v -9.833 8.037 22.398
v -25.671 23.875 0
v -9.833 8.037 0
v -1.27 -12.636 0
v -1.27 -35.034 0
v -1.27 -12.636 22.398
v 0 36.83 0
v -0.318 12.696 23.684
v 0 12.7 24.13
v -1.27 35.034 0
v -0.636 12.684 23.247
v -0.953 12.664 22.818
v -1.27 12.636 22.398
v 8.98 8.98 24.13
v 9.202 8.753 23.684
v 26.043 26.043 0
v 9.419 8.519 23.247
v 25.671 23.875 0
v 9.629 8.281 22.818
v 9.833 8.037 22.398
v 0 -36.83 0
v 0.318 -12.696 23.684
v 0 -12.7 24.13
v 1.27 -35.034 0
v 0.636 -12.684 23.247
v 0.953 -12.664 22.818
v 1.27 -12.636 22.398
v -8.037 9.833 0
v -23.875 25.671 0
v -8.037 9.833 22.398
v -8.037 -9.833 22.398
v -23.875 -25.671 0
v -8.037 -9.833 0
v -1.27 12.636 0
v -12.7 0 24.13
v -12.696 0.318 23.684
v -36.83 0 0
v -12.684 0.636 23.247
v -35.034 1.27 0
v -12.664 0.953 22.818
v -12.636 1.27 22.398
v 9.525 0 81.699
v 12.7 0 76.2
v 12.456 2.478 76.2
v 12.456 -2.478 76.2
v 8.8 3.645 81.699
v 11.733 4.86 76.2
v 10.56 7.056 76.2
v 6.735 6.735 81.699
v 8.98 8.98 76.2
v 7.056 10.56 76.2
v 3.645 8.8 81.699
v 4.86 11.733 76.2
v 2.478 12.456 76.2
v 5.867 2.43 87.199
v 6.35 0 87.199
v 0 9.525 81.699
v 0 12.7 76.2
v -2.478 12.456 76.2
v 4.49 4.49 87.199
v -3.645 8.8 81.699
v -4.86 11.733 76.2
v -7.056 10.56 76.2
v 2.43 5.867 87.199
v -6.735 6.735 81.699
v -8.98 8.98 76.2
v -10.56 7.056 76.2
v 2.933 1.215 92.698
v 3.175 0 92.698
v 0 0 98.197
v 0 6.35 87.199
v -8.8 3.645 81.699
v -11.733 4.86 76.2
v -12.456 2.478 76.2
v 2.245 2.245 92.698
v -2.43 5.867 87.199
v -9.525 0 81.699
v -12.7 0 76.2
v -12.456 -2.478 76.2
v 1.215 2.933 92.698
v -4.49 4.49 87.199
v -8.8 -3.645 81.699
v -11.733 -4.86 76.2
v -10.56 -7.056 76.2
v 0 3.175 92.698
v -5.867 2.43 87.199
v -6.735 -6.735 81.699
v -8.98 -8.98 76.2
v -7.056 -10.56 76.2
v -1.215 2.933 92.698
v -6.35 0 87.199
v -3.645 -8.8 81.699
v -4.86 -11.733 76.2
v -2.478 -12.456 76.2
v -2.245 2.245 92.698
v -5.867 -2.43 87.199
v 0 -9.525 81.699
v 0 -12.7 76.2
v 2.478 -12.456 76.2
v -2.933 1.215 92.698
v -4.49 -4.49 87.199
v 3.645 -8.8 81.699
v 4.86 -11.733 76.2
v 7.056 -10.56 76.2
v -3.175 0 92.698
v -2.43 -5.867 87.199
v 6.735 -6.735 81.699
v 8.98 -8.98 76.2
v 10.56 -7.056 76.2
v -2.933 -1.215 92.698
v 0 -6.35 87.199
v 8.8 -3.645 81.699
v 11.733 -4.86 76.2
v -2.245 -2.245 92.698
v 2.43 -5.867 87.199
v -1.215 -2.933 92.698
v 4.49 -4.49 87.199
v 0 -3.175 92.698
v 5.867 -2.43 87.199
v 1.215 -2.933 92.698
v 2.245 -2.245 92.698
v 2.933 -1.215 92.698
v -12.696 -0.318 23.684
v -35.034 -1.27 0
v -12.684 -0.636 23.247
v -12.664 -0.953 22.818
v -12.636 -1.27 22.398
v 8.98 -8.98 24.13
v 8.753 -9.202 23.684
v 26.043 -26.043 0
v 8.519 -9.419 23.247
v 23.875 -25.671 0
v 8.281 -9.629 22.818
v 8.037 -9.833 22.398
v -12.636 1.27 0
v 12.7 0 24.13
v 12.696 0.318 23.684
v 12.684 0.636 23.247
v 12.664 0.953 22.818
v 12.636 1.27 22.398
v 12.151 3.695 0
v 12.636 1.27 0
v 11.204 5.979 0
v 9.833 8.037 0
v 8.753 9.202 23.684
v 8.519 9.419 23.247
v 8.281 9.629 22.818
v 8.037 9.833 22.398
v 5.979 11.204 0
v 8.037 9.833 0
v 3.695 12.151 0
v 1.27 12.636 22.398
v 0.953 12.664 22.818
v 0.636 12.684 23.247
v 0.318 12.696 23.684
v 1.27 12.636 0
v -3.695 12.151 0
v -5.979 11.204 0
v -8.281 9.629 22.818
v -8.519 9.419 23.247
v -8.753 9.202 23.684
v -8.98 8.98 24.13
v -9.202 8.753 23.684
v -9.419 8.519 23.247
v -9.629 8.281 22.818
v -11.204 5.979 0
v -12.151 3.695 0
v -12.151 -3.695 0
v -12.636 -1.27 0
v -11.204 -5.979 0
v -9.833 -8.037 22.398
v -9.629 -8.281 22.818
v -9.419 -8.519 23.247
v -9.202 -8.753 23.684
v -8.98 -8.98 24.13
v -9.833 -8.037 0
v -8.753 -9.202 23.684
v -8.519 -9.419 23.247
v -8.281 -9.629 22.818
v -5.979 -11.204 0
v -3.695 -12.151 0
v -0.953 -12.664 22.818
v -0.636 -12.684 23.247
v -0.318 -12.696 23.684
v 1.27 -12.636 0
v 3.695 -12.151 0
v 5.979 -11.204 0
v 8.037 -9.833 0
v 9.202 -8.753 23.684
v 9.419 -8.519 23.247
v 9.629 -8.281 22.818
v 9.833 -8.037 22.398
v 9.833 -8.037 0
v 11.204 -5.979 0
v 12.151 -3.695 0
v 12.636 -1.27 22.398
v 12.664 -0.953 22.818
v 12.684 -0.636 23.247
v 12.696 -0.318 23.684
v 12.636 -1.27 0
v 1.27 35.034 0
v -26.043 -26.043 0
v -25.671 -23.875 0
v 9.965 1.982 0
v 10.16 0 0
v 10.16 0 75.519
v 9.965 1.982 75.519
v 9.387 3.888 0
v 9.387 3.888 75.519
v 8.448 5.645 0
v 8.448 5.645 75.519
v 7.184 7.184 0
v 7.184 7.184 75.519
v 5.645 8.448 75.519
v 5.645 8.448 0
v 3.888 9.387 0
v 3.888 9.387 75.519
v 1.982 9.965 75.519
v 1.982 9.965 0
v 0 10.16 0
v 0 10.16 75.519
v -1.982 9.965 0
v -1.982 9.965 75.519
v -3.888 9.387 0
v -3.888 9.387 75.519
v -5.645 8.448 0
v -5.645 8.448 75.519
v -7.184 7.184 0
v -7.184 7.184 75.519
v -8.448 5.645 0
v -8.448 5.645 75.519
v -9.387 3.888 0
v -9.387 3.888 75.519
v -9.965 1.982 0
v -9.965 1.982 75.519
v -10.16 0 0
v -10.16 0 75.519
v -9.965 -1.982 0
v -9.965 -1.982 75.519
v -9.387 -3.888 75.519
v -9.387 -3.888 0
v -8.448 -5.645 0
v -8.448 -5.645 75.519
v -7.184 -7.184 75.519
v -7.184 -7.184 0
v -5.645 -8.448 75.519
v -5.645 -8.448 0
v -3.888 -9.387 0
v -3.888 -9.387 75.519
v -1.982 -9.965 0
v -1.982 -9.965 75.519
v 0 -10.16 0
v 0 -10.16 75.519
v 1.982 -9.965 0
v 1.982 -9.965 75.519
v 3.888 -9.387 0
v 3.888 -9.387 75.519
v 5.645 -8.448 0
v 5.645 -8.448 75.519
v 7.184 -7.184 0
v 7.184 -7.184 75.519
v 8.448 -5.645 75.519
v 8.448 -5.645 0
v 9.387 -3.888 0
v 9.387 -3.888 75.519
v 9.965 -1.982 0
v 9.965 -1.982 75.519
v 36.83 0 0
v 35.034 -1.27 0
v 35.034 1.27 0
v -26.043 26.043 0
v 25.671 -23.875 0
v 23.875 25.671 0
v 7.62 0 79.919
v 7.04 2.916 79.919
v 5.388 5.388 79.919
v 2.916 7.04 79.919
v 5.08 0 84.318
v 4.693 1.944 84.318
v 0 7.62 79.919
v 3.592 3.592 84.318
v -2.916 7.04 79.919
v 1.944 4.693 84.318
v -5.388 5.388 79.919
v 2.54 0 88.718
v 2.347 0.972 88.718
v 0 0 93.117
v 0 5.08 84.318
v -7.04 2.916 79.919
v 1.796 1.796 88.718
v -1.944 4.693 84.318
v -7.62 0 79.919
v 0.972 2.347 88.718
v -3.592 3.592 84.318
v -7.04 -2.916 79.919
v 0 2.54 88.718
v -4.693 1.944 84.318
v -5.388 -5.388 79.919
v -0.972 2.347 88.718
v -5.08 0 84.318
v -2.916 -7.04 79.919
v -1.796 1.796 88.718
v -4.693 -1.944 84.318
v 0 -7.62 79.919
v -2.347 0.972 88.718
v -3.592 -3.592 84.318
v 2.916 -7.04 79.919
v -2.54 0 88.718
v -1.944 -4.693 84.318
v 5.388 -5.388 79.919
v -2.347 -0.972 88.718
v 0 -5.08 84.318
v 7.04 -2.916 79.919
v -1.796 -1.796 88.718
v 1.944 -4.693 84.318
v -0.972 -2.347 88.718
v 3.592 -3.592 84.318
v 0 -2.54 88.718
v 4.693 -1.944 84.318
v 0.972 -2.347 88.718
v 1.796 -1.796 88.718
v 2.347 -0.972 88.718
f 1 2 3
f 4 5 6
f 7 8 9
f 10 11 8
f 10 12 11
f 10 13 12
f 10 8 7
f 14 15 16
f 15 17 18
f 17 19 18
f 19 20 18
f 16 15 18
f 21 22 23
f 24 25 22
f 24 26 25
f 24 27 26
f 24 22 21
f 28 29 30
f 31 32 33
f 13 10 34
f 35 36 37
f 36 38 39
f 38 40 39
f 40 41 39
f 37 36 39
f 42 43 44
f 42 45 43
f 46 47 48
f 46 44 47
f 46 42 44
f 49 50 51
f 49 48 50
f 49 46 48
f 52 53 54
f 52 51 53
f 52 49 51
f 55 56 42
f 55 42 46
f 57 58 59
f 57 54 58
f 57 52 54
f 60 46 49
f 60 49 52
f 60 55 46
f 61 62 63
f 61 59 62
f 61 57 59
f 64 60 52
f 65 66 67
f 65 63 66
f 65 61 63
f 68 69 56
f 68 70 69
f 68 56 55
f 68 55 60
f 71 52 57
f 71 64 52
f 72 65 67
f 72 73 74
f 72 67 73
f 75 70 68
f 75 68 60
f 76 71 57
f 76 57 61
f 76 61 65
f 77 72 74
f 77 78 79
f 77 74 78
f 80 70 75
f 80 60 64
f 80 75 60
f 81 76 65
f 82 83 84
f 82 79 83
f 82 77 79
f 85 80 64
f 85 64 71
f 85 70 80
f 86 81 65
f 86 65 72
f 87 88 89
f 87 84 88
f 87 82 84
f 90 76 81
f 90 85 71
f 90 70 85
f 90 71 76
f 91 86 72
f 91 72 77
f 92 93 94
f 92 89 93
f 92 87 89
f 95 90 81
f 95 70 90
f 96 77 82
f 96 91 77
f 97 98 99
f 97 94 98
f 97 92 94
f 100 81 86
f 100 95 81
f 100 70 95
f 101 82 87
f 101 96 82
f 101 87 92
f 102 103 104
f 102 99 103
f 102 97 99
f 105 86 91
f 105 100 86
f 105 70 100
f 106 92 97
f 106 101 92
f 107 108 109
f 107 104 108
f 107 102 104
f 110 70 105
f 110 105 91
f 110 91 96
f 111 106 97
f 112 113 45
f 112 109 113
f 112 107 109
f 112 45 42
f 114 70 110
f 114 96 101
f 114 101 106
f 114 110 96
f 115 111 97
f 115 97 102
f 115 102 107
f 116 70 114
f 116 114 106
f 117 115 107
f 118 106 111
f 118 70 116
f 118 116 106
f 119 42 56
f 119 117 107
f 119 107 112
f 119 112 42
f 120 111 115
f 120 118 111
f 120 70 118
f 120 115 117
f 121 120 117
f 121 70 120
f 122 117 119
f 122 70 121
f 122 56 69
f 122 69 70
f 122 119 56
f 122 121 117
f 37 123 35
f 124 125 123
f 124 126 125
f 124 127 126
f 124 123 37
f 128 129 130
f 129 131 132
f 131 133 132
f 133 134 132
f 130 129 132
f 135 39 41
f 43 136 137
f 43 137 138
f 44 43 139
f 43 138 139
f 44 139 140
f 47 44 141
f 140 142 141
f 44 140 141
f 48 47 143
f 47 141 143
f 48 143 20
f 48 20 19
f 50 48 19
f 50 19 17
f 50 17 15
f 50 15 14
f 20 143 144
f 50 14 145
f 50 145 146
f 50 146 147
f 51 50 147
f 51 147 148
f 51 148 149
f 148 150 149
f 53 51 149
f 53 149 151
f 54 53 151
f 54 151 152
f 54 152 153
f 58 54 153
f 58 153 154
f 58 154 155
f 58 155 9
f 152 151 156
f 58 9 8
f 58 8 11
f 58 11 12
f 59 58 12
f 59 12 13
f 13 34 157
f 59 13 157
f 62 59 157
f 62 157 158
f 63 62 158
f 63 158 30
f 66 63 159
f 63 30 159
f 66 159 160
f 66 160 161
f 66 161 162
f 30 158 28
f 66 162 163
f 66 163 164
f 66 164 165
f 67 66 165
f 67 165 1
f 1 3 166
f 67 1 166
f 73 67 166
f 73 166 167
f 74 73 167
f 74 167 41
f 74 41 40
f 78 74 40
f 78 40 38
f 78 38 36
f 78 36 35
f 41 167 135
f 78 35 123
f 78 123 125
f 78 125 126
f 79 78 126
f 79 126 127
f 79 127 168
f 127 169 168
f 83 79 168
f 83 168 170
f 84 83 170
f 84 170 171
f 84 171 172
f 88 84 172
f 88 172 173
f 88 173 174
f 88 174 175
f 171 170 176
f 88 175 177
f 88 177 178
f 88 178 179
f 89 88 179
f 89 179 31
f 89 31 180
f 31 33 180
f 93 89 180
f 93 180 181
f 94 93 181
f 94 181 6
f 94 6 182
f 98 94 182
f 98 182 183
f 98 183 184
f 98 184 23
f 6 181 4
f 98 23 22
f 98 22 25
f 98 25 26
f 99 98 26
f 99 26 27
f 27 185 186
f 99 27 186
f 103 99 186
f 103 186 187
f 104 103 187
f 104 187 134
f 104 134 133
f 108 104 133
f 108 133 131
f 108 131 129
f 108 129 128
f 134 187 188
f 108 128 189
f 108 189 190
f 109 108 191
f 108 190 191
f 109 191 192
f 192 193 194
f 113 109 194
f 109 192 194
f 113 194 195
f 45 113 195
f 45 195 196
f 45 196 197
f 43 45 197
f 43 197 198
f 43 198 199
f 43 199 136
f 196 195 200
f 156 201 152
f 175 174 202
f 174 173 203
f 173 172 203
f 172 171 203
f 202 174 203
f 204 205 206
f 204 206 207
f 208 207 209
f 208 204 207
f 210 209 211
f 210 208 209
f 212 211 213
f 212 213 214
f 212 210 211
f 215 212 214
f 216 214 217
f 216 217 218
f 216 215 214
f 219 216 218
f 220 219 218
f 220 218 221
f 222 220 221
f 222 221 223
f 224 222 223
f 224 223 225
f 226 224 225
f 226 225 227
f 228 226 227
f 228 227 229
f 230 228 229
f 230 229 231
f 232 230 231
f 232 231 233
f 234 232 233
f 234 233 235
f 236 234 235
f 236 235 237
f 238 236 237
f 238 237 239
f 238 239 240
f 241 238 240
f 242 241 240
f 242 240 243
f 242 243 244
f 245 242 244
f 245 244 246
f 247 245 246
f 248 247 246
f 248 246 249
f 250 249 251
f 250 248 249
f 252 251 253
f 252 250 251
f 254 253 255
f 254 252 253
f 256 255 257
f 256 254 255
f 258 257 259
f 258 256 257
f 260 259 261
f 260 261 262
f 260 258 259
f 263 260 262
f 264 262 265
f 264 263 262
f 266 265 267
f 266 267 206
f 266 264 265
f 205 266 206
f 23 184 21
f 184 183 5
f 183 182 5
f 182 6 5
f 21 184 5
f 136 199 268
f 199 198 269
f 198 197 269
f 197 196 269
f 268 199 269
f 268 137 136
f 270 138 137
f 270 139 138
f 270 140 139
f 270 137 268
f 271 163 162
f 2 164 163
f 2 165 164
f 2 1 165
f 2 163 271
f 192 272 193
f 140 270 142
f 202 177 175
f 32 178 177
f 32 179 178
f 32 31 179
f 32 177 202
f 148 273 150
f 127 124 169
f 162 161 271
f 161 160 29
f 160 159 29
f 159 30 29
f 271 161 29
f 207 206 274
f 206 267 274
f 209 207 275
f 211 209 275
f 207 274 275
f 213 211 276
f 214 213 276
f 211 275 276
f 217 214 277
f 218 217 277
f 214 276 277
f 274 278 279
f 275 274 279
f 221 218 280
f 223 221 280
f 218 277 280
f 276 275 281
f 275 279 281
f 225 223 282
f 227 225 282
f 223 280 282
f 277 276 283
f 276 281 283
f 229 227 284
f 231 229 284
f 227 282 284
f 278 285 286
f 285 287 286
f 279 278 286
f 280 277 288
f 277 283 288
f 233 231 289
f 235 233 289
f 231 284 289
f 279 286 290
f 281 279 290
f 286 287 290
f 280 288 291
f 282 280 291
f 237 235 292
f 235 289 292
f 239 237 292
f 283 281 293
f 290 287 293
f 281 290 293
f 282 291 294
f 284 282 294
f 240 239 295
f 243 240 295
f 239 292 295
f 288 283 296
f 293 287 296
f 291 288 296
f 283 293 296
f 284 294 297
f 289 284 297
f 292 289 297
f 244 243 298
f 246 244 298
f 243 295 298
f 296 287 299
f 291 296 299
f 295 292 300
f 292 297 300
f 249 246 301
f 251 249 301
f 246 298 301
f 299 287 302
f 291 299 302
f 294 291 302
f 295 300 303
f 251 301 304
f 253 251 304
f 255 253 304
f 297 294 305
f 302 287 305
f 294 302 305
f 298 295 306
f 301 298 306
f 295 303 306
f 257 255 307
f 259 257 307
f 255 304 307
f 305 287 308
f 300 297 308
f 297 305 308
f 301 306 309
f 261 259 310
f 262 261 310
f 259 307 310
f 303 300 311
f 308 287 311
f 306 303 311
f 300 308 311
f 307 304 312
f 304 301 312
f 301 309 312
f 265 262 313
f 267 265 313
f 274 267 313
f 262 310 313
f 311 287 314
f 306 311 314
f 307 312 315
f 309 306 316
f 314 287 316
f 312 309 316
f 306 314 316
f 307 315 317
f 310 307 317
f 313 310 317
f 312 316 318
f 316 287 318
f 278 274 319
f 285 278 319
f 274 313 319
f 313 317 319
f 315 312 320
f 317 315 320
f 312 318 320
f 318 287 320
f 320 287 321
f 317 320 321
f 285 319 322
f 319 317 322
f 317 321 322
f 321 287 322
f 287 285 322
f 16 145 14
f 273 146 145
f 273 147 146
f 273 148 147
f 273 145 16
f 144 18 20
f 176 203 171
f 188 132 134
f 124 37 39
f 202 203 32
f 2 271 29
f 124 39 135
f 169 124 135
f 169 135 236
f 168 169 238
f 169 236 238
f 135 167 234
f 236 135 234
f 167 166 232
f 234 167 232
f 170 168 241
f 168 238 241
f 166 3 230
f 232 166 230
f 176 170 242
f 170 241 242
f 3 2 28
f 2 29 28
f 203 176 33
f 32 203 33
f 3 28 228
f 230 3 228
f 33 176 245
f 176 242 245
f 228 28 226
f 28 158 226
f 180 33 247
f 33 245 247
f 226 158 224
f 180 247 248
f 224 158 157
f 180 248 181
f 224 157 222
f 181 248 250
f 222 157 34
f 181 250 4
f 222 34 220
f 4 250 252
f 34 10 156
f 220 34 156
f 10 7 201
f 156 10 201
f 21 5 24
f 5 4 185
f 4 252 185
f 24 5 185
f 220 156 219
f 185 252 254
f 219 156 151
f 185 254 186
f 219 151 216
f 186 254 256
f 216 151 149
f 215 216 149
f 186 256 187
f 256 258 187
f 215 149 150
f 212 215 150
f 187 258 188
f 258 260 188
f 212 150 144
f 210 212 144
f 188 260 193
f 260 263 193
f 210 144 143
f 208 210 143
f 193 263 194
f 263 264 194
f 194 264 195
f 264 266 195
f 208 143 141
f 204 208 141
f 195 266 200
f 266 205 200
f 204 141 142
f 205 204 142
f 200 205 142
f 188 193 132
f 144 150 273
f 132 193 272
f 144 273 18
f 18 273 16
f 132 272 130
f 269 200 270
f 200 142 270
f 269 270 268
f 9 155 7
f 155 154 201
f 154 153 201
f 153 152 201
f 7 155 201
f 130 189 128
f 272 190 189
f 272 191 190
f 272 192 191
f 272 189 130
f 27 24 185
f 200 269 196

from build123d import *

# Parameters (mm, degrees)
F0_R      = 12.7
F1_DEPTH  = 76.2
F1_FACE_R = 12.7
F2_DEPTH  = 25.4
F2_TAPER  = 30
F3_T      = -2.54
F5_DEPTH  = 1.27
F6_SIZE   = 1.2699
F7_COUNT  = 8


# Not quite as in the source:
# - a fillet or chamfer is up to 0.001 mm smaller than in the source, because OpenCascade refuses the exact size


with BuildPart() as f1:
    # F0 (on Top) → F1 (new body)
    with BuildSketch(Plane.XY):
        Circle(F0_R)
    extrude(amount=F1_DEPTH)

    # F1_face (on face) → F2 (join)
    with BuildSketch(Plane.XY.offset(76.2)):
        Circle(F1_FACE_R)
    extrude(amount=F2_DEPTH, taper=F2_TAPER)

    # F3
    f3_openings = [f1.faces().sort_by_distance(p)[0] for p in [
        (0, 0, 0),
    ]]
    offset(amount=F3_T, openings=f3_openings)

    # F4 (on Front) → F5 (join, symmetric)
    with BuildSketch(Plane.XZ):
        Polygon((-11.43, 25.4), (-36.83, 0), (-11.43, 0), align=None)
    extrude(amount=F5_DEPTH, both=True)

    # F6 (size 1.27 in the source; OpenCascade refuses exactly that, so slightly less here)
    f6_edges = [f1.edges().sort_by_distance(p)[0] for p in [
        (-24.73317, -1.27, 12.09683),
        (-24.73317, 1.27, 12.09683),
    ]]
    chamfer(f6_edges, length=F6_SIZE)

    # F7: F1 ×8 about axis
    f7_axis = Axis((0, 0, 0), (0, 0, 1))


with BuildPart() as f1_1:
    add(f1.part)
    for i in range(1, F7_COUNT):
        add(f1.part.rotate(f7_axis, i * 360 / F7_COUNT))


solid = f1_1.part
